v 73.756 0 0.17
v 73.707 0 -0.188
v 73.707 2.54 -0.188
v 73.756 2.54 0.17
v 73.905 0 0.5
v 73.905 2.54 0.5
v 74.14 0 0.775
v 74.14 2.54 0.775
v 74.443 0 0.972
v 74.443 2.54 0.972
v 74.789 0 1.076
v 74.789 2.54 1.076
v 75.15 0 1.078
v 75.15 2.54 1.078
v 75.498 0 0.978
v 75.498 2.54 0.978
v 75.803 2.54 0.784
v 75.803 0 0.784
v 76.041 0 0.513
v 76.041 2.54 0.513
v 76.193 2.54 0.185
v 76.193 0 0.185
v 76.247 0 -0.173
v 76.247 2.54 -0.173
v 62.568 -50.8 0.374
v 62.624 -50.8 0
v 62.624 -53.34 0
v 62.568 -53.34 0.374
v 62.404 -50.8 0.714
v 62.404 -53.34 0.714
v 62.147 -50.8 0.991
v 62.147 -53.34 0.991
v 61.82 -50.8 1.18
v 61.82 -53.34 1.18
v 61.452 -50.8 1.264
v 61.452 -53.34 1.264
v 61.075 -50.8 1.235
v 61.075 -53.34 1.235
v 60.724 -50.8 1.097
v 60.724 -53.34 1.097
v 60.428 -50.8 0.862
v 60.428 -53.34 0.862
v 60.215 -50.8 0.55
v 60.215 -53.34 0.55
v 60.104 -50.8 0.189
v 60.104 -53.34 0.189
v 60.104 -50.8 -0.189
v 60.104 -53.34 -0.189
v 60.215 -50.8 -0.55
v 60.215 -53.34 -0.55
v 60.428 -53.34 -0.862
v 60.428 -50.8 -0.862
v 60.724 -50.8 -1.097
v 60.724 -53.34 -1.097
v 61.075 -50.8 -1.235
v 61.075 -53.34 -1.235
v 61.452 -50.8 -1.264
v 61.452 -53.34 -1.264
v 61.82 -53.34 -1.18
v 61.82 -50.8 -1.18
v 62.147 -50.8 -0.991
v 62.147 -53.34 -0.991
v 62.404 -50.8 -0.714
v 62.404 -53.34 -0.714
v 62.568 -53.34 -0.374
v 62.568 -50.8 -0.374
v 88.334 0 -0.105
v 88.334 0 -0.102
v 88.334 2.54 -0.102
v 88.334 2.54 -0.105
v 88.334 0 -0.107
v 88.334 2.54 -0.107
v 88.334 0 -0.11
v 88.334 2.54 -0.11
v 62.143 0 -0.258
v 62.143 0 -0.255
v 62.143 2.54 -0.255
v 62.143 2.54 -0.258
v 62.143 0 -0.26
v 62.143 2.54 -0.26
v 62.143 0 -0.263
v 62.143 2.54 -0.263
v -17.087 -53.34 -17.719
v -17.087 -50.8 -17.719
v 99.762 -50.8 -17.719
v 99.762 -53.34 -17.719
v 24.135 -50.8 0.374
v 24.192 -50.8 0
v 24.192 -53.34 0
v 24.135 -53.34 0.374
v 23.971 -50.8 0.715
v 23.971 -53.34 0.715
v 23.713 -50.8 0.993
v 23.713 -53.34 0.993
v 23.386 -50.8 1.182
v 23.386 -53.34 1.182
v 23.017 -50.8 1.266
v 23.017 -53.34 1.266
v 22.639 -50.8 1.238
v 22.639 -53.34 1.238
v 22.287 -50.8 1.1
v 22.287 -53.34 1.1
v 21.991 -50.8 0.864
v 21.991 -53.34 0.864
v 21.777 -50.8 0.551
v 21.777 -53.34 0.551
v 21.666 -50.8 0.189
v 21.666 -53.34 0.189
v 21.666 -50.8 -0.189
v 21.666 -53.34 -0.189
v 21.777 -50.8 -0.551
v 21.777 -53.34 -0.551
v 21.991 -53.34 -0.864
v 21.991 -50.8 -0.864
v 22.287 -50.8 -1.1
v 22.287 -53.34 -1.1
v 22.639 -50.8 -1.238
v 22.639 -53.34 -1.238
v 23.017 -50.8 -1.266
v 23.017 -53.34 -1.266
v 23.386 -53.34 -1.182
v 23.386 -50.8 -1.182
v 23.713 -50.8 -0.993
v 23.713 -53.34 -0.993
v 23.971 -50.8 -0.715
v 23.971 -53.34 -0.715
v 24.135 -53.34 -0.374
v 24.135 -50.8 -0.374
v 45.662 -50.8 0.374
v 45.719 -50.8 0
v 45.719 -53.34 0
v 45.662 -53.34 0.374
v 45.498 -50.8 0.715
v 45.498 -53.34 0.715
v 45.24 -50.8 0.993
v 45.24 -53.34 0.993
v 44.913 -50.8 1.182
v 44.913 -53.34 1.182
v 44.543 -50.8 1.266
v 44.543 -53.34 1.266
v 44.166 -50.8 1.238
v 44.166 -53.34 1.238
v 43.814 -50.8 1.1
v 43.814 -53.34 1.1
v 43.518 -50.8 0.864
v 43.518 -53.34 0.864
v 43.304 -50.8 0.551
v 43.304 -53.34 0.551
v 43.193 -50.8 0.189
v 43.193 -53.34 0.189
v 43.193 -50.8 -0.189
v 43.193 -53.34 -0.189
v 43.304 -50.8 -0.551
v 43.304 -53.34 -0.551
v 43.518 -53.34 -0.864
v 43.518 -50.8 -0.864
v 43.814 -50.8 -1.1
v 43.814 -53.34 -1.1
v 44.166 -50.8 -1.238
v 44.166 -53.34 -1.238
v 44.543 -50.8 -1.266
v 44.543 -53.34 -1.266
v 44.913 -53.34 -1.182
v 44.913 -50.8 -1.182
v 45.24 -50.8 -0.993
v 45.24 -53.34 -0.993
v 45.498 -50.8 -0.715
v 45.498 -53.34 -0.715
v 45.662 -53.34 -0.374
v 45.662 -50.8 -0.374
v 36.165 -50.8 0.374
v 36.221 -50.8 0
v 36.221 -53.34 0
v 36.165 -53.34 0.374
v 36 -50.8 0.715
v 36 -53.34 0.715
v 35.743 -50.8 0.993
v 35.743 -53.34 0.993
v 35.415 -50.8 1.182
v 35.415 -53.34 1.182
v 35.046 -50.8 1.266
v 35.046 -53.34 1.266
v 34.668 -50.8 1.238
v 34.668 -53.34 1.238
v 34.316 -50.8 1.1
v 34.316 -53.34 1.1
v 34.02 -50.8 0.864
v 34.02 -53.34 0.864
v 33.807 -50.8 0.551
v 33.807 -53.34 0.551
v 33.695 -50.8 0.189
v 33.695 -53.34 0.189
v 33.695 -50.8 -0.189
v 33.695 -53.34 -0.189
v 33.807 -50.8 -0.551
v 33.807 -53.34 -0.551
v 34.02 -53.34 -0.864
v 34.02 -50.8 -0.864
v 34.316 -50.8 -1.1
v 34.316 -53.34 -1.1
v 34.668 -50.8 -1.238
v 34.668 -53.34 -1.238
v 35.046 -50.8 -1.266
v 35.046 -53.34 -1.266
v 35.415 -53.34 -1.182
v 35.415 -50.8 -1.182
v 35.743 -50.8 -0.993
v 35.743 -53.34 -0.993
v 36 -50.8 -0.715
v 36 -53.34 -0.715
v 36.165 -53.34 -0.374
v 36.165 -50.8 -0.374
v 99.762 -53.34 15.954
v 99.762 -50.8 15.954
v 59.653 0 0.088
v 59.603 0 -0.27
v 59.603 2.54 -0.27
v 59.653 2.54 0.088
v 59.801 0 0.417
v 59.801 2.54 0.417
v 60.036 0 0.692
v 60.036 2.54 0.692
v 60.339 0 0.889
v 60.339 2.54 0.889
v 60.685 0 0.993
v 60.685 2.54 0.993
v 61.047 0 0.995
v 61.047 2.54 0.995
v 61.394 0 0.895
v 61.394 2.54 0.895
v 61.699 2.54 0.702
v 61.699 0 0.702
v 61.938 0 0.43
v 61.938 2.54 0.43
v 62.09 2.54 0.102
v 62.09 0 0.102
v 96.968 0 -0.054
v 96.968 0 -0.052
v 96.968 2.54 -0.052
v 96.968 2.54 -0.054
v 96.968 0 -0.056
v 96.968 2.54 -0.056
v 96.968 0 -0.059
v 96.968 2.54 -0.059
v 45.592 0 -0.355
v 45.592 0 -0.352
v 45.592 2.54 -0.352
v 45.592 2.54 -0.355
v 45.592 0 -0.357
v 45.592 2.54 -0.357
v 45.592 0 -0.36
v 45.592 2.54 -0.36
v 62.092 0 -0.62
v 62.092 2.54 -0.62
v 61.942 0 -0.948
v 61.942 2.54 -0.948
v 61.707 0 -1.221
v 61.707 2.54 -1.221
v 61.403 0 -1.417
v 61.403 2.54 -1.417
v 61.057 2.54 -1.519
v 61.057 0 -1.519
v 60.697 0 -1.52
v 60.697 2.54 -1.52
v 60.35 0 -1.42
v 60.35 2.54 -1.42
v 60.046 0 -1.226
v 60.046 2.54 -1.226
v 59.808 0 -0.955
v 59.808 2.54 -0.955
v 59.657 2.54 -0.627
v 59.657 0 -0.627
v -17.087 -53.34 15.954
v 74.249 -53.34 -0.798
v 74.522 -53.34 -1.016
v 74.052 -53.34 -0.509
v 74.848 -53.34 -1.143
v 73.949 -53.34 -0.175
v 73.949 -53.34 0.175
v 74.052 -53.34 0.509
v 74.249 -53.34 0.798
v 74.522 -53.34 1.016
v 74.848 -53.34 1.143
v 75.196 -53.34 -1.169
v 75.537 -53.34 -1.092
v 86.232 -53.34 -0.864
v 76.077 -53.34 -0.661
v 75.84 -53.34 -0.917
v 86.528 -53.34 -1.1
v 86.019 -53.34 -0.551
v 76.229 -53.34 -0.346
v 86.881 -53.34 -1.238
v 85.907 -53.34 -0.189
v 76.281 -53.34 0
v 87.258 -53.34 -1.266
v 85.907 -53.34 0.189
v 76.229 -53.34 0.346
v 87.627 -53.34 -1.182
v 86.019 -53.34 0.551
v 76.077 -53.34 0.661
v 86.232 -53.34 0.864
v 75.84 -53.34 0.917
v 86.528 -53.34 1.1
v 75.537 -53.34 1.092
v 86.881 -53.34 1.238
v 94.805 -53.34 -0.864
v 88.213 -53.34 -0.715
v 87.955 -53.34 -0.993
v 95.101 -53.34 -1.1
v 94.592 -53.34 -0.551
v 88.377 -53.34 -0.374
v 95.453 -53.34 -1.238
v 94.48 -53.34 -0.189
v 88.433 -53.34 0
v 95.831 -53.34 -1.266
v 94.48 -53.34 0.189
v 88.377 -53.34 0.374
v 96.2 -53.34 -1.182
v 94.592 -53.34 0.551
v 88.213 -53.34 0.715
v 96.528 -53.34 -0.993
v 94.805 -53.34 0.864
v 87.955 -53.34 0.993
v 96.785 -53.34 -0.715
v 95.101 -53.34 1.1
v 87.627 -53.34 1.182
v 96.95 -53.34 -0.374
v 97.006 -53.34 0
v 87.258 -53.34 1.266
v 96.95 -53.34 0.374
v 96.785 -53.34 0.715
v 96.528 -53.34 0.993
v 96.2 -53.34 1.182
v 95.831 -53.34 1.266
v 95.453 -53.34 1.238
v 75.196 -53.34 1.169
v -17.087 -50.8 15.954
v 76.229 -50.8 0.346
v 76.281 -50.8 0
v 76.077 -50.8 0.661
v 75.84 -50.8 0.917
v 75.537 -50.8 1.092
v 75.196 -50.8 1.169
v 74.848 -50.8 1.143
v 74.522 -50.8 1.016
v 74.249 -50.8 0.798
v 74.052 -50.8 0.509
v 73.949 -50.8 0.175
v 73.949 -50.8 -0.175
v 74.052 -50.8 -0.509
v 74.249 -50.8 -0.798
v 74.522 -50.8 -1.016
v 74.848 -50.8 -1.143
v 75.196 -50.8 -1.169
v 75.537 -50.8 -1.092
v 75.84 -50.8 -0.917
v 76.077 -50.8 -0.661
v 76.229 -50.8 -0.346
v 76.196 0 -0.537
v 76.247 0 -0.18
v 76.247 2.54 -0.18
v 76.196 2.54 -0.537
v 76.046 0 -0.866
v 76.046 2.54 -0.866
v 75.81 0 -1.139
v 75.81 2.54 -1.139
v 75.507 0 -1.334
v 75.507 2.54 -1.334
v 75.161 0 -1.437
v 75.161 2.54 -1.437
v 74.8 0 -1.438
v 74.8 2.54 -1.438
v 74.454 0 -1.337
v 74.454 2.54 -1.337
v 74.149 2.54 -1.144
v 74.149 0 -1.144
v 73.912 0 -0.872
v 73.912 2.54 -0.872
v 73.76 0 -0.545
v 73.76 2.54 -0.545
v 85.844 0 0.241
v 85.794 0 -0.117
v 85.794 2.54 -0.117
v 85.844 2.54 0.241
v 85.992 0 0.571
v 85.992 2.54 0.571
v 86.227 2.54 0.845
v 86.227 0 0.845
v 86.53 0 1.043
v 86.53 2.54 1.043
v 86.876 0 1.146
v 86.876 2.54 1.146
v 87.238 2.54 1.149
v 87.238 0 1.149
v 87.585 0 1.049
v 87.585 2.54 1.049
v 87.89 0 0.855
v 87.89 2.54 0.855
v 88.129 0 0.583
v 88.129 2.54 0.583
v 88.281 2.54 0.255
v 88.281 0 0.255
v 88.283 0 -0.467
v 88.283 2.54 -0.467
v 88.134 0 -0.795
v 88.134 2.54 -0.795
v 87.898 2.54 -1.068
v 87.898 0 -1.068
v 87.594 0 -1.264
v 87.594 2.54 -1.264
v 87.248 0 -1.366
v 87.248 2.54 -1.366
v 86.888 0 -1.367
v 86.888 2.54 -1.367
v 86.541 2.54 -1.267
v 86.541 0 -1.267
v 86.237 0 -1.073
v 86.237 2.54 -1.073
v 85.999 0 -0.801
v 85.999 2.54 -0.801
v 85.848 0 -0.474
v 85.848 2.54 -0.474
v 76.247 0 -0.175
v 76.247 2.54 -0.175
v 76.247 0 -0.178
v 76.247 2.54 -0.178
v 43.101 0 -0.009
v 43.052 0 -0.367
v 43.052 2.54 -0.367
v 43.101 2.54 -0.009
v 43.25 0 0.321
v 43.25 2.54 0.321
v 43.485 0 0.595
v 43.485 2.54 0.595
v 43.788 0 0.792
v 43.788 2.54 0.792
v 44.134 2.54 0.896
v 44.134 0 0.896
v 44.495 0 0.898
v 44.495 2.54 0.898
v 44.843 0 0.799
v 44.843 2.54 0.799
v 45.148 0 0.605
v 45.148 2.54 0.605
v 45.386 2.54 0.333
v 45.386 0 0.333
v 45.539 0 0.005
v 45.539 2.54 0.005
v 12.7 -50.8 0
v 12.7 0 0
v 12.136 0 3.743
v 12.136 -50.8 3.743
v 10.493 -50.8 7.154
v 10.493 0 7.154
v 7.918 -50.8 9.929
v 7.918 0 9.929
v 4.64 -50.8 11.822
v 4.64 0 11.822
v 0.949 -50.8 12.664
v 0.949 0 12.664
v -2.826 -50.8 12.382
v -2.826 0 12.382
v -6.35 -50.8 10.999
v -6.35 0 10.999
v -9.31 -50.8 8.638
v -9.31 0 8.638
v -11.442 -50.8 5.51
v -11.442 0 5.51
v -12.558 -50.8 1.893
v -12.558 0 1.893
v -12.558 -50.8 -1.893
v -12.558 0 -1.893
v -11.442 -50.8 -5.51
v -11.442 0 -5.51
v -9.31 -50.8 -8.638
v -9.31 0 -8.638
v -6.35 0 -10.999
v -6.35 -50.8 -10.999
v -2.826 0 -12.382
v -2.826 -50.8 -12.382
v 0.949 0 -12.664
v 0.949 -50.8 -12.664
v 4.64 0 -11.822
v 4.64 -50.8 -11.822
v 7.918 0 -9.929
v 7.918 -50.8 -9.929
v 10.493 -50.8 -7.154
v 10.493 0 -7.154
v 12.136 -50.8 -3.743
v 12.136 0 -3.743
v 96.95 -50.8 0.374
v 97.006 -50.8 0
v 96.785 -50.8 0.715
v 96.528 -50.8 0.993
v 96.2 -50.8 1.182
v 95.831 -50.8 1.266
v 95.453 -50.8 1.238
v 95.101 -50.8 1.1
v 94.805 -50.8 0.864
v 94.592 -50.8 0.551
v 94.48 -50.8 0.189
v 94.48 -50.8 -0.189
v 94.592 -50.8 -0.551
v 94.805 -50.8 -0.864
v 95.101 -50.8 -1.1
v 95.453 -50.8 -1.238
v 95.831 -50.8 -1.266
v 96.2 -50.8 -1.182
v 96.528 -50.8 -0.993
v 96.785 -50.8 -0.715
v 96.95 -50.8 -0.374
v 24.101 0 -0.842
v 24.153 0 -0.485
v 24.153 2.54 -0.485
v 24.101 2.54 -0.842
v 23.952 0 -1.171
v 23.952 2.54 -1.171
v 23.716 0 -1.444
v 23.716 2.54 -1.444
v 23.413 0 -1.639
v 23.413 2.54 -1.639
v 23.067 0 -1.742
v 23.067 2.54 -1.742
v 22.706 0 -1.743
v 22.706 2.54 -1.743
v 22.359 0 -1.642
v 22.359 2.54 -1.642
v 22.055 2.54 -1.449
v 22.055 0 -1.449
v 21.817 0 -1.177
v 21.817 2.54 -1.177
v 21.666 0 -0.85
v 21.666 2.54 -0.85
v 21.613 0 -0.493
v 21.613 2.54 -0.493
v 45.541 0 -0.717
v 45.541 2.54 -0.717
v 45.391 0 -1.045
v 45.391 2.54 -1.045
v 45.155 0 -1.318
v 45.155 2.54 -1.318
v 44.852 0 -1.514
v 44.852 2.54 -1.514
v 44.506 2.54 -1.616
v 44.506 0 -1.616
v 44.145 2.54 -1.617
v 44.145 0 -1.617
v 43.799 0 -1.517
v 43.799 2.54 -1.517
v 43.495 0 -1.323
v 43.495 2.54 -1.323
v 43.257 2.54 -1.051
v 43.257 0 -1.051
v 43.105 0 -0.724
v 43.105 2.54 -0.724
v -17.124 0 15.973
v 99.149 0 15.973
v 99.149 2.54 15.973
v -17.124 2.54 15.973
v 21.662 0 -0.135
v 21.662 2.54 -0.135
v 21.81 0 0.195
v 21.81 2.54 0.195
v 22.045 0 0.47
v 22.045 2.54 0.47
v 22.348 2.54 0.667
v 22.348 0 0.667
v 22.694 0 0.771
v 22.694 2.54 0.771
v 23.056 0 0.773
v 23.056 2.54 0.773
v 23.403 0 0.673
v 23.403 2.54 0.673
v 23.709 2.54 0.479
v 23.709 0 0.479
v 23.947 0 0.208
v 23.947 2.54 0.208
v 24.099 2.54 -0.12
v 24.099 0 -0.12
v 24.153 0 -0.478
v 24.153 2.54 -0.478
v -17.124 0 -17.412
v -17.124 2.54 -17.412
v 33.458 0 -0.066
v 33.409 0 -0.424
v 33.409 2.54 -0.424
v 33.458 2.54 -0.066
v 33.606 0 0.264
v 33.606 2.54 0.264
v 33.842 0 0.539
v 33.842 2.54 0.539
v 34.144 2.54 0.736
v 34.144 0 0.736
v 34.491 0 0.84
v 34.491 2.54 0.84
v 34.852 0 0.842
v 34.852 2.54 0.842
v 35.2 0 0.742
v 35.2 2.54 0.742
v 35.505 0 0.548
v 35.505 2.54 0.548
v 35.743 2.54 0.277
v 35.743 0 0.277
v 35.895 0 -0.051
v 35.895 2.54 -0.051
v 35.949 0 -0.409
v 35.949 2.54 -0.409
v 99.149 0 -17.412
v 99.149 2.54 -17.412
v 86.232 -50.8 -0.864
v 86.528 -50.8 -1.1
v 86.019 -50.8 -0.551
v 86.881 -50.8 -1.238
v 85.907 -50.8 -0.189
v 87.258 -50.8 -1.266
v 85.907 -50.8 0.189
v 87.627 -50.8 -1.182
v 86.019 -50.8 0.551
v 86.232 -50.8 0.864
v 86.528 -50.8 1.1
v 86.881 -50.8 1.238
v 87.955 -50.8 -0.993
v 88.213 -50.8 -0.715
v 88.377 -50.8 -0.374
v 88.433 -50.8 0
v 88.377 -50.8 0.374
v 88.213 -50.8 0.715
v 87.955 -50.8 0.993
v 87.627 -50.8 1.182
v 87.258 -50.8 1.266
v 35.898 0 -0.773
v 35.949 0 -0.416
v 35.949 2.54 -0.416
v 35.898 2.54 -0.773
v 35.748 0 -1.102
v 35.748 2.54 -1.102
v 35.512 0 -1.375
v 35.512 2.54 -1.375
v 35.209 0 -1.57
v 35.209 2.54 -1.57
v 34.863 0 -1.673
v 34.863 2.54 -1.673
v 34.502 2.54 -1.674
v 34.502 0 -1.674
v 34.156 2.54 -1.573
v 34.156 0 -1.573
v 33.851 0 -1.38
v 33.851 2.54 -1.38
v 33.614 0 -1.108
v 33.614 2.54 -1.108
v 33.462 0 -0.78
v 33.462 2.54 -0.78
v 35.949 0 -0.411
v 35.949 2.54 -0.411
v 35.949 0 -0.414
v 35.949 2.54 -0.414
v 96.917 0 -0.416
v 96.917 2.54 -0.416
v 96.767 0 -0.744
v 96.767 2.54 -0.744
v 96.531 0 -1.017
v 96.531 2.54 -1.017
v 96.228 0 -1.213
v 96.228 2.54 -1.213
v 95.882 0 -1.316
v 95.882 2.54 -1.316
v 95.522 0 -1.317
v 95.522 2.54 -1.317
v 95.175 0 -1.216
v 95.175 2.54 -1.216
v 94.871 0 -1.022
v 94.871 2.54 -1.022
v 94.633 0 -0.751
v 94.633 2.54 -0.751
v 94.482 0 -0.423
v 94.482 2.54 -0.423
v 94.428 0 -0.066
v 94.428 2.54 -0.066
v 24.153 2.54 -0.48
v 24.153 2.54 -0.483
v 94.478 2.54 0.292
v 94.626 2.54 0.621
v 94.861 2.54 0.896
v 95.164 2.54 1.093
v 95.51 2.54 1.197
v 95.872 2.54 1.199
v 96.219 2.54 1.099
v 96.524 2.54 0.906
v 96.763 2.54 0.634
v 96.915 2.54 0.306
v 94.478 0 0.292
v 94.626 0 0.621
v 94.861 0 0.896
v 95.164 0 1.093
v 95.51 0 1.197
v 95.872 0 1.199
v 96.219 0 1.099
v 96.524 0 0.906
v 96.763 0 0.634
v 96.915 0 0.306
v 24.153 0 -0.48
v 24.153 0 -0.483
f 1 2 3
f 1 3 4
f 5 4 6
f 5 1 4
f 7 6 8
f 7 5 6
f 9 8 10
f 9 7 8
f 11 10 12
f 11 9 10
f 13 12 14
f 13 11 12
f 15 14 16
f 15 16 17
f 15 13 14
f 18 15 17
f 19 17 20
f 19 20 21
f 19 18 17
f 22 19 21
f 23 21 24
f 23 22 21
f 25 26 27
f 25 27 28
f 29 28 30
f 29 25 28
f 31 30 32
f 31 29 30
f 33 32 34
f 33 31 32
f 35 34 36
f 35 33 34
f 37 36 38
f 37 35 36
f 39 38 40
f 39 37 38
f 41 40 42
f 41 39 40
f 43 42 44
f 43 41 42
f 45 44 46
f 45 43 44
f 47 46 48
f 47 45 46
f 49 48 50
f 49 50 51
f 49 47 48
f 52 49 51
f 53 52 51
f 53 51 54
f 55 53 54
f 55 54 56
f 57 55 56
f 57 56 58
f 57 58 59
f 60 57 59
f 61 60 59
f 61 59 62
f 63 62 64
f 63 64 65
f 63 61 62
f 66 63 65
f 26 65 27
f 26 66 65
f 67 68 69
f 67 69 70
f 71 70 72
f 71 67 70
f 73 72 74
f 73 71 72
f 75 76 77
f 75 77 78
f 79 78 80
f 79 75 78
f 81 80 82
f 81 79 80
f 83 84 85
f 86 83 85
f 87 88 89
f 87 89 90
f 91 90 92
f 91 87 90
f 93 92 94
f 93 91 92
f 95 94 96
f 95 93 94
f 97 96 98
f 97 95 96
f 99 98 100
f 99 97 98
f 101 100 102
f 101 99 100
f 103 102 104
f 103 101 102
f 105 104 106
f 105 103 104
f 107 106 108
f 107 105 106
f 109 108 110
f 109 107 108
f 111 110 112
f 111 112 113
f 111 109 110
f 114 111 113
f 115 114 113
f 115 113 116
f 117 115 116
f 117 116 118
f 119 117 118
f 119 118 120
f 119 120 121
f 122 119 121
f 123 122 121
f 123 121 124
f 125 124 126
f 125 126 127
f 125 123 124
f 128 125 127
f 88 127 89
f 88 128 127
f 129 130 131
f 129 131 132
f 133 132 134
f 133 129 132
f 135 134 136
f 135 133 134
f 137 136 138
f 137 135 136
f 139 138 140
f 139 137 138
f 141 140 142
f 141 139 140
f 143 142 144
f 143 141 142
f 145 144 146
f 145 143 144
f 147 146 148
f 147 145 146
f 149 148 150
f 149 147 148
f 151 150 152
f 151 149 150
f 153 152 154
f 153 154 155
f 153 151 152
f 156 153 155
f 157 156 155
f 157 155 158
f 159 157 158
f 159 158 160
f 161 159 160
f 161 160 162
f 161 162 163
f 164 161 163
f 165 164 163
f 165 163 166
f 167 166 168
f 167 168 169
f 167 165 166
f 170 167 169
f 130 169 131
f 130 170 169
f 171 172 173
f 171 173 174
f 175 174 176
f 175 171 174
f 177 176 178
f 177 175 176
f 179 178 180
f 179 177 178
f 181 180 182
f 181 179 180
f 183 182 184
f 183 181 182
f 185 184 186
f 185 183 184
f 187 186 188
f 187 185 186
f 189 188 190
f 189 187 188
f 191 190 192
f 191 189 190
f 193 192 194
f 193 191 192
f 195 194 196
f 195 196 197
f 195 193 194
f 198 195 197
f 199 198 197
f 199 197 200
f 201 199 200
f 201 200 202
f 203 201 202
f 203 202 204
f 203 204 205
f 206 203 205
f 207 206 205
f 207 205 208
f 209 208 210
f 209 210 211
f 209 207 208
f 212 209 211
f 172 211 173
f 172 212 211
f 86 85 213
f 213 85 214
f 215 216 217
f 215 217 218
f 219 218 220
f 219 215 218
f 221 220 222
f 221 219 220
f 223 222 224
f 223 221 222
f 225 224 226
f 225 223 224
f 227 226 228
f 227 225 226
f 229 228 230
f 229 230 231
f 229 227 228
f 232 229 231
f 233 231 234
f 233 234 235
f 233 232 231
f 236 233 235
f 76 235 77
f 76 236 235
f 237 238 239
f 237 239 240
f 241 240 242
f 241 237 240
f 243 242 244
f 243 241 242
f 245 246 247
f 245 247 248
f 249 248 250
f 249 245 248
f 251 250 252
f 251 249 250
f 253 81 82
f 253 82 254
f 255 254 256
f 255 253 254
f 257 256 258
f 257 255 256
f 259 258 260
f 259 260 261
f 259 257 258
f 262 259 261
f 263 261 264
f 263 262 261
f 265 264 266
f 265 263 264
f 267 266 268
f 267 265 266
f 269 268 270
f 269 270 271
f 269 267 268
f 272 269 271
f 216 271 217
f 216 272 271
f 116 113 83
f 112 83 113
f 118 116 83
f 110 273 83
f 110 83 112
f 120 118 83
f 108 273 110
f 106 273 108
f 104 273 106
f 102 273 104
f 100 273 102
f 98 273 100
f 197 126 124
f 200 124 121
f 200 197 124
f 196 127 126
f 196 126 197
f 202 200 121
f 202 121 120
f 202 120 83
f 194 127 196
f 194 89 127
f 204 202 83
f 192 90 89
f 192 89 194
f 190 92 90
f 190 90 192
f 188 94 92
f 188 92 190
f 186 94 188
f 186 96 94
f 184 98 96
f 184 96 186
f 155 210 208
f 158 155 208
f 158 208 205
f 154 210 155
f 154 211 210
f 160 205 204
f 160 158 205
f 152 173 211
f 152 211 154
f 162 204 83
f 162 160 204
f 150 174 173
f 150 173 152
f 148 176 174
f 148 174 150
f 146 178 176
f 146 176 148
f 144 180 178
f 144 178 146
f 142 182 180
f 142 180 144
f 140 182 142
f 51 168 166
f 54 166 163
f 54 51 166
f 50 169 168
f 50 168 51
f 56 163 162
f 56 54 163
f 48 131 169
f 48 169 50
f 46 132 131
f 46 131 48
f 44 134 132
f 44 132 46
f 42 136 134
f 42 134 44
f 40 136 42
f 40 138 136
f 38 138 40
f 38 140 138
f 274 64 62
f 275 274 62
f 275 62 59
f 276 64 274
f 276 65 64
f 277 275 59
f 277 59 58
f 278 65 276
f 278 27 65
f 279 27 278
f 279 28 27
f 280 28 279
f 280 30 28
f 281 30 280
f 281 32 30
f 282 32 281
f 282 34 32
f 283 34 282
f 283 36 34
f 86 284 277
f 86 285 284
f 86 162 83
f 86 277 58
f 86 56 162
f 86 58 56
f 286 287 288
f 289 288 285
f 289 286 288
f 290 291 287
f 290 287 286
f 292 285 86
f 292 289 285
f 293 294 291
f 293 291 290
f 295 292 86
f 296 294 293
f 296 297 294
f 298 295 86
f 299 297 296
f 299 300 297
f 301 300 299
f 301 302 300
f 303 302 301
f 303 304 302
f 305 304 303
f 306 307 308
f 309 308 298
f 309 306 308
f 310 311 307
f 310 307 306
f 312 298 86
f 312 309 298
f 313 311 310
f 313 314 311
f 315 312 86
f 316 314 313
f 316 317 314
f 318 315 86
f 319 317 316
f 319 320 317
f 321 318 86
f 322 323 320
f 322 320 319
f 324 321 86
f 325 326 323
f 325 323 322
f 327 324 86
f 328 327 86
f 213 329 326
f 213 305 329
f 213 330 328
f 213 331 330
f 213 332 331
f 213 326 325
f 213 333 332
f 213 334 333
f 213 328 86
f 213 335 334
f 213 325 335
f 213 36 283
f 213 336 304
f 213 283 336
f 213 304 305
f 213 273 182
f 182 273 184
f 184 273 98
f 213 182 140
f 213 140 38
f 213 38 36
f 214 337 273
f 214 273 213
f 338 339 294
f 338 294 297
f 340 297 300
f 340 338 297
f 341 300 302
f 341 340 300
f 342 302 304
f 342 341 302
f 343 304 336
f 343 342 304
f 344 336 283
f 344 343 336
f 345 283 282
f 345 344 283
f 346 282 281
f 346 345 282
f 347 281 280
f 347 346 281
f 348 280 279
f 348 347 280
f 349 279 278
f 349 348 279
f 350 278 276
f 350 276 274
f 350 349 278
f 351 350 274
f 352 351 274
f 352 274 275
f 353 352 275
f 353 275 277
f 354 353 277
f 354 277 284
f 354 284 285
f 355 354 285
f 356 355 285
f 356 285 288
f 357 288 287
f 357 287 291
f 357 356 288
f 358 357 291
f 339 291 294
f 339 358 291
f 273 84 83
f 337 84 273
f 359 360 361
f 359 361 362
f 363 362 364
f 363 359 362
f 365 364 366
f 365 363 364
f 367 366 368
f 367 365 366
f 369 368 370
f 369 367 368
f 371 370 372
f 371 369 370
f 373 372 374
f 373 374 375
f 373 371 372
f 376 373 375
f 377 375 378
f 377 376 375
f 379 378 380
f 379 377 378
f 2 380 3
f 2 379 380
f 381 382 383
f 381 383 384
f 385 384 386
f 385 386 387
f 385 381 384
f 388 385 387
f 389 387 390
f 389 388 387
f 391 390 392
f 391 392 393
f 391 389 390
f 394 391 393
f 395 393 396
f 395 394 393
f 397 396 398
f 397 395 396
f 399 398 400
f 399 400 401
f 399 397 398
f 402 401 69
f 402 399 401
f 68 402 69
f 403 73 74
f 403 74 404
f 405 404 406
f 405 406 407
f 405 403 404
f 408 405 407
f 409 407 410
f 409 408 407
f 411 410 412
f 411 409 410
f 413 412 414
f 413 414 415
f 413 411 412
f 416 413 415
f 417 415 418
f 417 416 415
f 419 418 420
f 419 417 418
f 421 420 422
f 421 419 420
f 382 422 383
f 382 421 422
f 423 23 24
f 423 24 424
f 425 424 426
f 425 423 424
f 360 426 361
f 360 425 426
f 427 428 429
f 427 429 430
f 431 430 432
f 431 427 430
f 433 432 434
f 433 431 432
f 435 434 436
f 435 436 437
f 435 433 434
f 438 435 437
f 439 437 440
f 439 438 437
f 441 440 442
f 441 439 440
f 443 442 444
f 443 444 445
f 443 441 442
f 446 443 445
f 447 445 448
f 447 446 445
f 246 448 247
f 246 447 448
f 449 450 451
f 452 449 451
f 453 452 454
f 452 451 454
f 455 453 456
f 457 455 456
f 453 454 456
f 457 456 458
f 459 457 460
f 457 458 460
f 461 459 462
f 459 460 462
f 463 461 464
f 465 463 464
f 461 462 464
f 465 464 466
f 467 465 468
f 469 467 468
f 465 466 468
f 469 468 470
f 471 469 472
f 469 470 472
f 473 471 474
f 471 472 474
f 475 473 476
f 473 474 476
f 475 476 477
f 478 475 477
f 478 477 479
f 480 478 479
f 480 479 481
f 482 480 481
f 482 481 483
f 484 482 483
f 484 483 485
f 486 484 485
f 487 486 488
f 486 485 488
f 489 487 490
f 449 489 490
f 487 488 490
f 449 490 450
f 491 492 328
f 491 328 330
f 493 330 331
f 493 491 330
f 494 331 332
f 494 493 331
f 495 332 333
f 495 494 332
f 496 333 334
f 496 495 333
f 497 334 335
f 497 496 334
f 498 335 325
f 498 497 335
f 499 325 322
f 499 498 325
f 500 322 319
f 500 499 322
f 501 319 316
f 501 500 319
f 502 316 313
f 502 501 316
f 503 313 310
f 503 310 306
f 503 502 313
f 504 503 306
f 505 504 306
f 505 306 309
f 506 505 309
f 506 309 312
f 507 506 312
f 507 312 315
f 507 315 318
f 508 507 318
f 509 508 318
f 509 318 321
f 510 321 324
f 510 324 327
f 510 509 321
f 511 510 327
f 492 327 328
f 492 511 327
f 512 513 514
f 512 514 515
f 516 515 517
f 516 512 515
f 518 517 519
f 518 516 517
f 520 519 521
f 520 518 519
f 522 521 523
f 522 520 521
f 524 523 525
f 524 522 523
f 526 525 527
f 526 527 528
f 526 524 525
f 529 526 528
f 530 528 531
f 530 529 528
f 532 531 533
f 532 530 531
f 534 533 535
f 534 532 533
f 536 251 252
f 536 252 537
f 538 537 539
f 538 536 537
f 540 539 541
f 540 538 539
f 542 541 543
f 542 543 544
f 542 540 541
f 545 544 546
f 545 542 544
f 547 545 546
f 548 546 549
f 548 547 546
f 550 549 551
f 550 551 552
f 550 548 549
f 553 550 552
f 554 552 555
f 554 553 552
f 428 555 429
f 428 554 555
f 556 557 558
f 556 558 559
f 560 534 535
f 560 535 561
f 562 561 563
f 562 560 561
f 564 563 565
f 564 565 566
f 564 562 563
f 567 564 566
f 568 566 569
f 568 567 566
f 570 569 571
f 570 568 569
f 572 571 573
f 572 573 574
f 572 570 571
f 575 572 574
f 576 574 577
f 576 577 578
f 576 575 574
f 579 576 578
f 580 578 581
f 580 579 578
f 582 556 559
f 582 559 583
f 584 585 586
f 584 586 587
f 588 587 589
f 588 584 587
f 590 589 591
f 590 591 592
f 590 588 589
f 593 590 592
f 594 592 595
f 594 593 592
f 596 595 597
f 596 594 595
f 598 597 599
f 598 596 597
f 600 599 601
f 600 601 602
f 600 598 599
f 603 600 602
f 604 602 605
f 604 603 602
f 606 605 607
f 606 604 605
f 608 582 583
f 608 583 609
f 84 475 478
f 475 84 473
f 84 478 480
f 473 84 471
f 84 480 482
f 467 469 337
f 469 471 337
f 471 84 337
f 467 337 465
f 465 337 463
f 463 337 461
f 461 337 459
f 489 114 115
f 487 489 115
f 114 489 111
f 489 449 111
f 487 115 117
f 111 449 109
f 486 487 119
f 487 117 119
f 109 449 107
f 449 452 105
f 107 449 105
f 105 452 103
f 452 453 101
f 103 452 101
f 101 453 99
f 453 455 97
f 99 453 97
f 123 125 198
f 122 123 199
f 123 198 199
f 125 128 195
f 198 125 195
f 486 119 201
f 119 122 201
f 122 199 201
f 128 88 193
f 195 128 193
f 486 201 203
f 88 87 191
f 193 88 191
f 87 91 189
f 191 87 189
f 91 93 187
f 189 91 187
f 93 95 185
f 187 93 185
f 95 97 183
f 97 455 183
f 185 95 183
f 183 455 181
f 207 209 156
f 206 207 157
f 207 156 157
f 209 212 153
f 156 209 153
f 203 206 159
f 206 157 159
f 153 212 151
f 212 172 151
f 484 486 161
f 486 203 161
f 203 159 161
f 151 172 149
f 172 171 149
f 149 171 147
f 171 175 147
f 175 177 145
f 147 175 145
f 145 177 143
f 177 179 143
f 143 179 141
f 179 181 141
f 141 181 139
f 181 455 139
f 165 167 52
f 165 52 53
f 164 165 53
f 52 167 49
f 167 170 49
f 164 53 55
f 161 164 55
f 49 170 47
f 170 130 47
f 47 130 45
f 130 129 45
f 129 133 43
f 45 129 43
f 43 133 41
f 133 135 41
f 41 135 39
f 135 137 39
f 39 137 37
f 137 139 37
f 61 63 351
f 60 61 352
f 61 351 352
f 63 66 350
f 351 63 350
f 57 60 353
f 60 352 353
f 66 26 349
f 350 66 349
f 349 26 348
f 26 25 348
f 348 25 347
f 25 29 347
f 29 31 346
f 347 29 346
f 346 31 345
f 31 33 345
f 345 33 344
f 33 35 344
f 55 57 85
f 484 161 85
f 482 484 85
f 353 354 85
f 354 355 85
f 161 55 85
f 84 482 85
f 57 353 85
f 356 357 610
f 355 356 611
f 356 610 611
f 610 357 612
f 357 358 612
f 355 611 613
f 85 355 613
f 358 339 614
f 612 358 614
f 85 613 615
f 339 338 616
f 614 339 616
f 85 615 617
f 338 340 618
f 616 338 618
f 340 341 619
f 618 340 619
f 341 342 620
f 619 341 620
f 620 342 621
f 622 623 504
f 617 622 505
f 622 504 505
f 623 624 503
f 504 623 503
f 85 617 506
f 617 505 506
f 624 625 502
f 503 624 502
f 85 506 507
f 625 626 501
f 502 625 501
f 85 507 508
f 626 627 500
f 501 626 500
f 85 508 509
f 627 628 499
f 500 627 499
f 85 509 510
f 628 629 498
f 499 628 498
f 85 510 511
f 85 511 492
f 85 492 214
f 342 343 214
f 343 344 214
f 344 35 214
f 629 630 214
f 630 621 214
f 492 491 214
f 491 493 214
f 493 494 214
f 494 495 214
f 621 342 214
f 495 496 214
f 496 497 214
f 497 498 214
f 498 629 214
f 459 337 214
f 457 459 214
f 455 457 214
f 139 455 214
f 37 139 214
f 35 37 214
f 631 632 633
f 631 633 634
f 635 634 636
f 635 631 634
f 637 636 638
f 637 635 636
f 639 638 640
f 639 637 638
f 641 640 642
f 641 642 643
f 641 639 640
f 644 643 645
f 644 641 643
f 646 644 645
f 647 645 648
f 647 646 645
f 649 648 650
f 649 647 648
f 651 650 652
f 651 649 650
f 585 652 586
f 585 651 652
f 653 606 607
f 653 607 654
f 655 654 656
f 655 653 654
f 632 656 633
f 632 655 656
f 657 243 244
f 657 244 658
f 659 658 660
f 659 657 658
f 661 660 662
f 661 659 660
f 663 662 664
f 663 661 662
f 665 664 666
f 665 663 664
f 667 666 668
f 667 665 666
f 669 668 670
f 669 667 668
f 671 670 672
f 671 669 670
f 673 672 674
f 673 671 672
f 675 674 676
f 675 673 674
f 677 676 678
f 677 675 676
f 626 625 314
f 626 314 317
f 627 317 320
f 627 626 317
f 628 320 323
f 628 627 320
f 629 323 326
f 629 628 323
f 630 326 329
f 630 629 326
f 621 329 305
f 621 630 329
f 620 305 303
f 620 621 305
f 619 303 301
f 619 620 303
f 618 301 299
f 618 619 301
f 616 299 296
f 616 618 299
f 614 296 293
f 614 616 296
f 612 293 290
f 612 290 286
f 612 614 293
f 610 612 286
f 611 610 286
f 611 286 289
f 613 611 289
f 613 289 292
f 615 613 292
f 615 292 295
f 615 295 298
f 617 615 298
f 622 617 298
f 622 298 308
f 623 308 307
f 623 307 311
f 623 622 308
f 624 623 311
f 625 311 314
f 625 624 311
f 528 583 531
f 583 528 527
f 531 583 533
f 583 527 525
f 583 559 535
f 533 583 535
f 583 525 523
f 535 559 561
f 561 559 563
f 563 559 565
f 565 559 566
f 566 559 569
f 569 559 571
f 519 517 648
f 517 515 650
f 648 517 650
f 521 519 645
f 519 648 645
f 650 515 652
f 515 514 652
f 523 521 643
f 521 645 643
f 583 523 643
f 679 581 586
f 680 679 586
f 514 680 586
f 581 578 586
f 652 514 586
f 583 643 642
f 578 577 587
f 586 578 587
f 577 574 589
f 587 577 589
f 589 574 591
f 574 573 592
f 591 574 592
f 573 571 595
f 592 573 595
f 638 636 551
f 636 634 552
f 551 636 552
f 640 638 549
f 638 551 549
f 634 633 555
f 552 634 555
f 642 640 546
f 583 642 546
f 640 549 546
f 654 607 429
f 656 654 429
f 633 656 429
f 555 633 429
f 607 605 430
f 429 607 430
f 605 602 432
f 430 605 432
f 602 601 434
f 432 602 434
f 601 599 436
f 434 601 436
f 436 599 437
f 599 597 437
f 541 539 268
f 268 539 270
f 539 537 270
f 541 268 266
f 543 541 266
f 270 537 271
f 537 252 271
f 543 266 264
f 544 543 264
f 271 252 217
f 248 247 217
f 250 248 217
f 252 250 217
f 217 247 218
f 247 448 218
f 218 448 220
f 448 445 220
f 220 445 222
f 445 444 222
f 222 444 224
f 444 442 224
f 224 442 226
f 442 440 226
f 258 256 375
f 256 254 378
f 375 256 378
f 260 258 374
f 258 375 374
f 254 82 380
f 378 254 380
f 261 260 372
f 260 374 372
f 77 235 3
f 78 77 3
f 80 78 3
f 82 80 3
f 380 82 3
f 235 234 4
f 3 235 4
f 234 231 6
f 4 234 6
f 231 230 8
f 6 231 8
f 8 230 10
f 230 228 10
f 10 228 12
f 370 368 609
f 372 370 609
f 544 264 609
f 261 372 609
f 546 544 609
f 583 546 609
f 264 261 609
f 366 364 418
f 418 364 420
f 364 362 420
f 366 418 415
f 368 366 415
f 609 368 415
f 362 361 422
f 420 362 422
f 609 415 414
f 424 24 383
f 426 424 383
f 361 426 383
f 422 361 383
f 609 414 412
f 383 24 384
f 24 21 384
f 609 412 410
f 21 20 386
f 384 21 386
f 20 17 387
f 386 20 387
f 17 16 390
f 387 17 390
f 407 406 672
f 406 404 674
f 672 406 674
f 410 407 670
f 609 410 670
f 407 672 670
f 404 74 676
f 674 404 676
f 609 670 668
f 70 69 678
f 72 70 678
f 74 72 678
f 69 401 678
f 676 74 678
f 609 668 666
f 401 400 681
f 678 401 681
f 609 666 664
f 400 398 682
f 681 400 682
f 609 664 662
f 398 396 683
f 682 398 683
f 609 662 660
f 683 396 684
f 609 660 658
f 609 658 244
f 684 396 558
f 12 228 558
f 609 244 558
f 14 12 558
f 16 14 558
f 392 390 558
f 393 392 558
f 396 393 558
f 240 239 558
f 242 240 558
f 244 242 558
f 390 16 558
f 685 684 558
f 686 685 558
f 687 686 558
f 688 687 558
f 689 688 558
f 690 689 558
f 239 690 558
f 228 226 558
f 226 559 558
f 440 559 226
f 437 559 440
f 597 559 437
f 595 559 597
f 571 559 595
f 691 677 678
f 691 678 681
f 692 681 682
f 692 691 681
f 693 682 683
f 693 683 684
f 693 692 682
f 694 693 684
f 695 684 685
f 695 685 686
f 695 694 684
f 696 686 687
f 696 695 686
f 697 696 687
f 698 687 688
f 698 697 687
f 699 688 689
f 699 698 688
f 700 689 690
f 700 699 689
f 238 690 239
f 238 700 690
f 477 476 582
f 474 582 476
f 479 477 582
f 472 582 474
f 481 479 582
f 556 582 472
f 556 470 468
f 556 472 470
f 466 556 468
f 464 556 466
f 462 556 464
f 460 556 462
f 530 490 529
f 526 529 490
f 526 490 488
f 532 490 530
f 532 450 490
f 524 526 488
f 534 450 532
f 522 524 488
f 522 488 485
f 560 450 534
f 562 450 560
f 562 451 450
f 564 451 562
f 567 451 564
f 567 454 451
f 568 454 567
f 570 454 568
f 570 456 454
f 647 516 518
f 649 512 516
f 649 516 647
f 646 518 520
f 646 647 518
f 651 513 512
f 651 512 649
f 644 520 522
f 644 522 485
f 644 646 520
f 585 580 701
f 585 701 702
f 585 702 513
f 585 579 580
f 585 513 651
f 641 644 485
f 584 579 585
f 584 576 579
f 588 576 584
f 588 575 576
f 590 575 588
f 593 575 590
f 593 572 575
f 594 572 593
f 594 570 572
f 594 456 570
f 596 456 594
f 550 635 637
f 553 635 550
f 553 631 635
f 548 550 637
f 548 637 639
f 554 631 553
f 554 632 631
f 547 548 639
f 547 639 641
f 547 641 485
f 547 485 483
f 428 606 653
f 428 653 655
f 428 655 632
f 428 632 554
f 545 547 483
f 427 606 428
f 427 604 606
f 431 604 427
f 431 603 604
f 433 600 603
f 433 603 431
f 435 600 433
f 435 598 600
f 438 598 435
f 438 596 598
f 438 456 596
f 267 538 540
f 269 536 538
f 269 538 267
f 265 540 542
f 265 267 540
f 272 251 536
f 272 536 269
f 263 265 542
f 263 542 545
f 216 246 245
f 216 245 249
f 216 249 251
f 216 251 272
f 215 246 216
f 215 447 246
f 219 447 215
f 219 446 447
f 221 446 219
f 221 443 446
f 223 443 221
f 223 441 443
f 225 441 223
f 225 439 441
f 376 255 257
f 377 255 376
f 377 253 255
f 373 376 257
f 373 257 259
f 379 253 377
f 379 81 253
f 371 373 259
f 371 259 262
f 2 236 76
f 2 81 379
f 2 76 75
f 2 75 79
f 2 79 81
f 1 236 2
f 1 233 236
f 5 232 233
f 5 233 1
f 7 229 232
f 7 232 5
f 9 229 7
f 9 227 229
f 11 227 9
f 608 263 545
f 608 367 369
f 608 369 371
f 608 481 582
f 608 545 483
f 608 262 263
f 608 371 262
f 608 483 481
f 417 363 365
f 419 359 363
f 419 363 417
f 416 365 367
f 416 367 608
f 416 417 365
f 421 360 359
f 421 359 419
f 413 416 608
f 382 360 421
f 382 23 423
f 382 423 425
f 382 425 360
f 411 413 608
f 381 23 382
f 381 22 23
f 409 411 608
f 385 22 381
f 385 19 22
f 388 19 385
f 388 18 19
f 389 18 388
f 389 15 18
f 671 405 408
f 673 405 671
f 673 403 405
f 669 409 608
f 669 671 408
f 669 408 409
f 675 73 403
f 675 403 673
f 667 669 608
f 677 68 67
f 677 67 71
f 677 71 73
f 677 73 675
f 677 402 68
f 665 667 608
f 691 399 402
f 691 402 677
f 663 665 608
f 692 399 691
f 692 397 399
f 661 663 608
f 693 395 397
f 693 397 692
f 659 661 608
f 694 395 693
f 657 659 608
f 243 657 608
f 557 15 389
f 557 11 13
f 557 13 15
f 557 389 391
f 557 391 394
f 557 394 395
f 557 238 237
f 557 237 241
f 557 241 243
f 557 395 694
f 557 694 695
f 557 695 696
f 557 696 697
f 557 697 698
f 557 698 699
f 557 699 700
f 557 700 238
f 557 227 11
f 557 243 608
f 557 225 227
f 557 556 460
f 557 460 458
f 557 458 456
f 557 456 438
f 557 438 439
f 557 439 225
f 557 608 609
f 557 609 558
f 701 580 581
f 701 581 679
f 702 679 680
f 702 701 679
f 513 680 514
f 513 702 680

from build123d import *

# Parameters (mm, degrees)
F0_R     = 12.7
F1_DEPTH = 50.8
F2_R     = 1.27
F3_DEPTH = 2.54
F4_R     = 1.27
F5_DEPTH = 2.54
F7_DEPTH = 2.54
F8_W     = 116.849138
F8_H     = 33.673273
F8_R     = 1.27
F8_R_2   = 1.267219
F8_R_3   = 1.172691
F9_DEPTH = 2.54


with BuildPart() as f1:
    # F0 (on Front) → F1 (new body)
    with BuildSketch(Plane.XZ):
        Circle(F0_R)
    extrude(amount=F1_DEPTH)

    # F2 (on face) → F3 (join)
    with BuildSketch(Plane.XZ.offset(50.8)):
        Circle(F2_R)
    extrude(amount=F3_DEPTH)

    # F4 (on face) → F5 (join)
    with BuildSketch(Plane(origin=(0, 0, 0), x_dir=(-1, 0, 0), z_dir=(0, 1, 0))):
        Circle(F4_R)
    extrude(amount=F5_DEPTH)

    # F6 (on Front) → F7 (join)
    with BuildSketch(Plane.XZ):
        with BuildLine():
            Line((21.612578, -0.492717), (-17.124444, -0.719515))
            Line((-17.124444, -0.719515), (-17.124444, -17.412249))
            Line((-17.124444, -17.412249), (99.149086, -17.412249))
            Line((99.149086, -17.412249), (99.149086, -0.038756))
            Line((99.149086, -0.038756), (96.968265, -0.051524))
            ThreePointArc((96.968265, -0.051524), (96.968281, -0.055242), (96.968286, -0.05896))
            ThreePointArc((96.968286, -0.05896), (95.702004, -1.328954), (94.428308, -0.066395))
            Line((94.428308, -0.066395), (88.334388, -0.102074))
            ThreePointArc((88.334388, -0.102074), (88.334405, -0.105792), (88.33441, -0.109509))
            ThreePointArc((88.33441, -0.109509), (87.068128, -1.379504), (85.794432, -0.116945))
            Line((85.794432, -0.116945), (76.246966, -0.172843))
            ThreePointArc((76.246966, -0.172843), (76.246982, -0.176561), (76.246987, -0.180279))
            ThreePointArc((76.246987, -0.180279), (74.980705, -1.450273), (73.707009, -0.187714))
            Line((73.707009, -0.187714), (62.143279, -0.255418))
            ThreePointArc((62.143279, -0.255418), (62.143295, -0.259135), (62.143301, -0.262853))
            ThreePointArc((62.143301, -0.262853), (60.877019, -1.532848), (59.603323, -0.270289))
            Line((59.603323, -0.270289), (45.592063, -0.352322))
            ThreePointArc((45.592063, -0.352322), (45.592079, -0.35604), (45.592085, -0.359757))
            ThreePointArc((45.592085, -0.359757), (44.325802, -1.629752), (43.052106, -0.367193))
            Line((43.052106, -0.367193), (35.948796, -0.408781))
            ThreePointArc((35.948796, -0.408781), (35.948813, -0.412499), (35.948818, -0.416217))
            ThreePointArc((35.948818, -0.416217), (34.682536, -1.686211), (33.40884, -0.423652))
            Line((33.40884, -0.423652), (24.152535, -0.477846))
            ThreePointArc((24.152535, -0.477846), (24.152551, -0.481564), (24.152557, -0.485282))
            ThreePointArc((24.152557, -0.485282), (22.886274, -1.755276), (21.612578, -0.492717))
        make_face()
        with BuildLine():
            Line((99.149086, 15.97322), (-17.124444, 15.97322))
            Line((-17.124444, 15.97322), (-17.124444, -0.719515))
            Line((-17.124444, -0.719515), (21.612578, -0.492717))
            ThreePointArc((21.612578, -0.492717), (22.875121, 0.784697), (24.152535, -0.477846))
            Line((24.152535, -0.477846), (33.40884, -0.423652))
            ThreePointArc((33.40884, -0.423652), (34.671383, 0.853761), (35.948796, -0.408781))
            Line((35.948796, -0.408781), (43.052106, -0.367193))
            ThreePointArc((43.052106, -0.367193), (44.314649, 0.910221), (45.592063, -0.352322))
            Line((45.592063, -0.352322), (59.603323, -0.270289))
            ThreePointArc((59.603323, -0.270289), (60.865865, 1.007125), (62.143279, -0.255418))
            Line((62.143279, -0.255418), (73.707009, -0.187714))
            ThreePointArc((73.707009, -0.187714), (74.969552, 1.089699), (76.246966, -0.172843))
            Line((76.246966, -0.172843), (85.794432, -0.116945))
            ThreePointArc((85.794432, -0.116945), (87.056975, 1.160469), (88.334388, -0.102074))
            Line((88.334388, -0.102074), (94.428308, -0.066395))
            ThreePointArc((94.428308, -0.066395), (95.690851, 1.211018), (96.968265, -0.051524))
            Line((96.968265, -0.051524), (99.149086, -0.038756))
            Line((99.149086, -0.038756), (99.149086, 15.97322))
        make_face()
    extrude(amount=-F7_DEPTH)

    # F8 (on face) → F9 (join)
    with BuildSketch(Plane.XZ.offset(50.8)):
        with Locations((41.337759, -0.882761)):
            Rectangle(F8_W, F8_H)
        Circle(F8_R, mode=Mode.SUBTRACT)
        with Locations((22.921631, 0)):
            Circle(F8_R, mode=Mode.SUBTRACT)
        with Locations((34.950949, 0)):
            Circle(F8_R, mode=Mode.SUBTRACT)
        with Locations((44.44854, 0)):
            Circle(F8_R, mode=Mode.SUBTRACT)
        with Locations((61.357126, 0)):
            Circle(F8_R_2, mode=Mode.SUBTRACT)
        with Locations((75.108536, 0)):
            Circle(F8_R_3, mode=Mode.SUBTRACT)
        with Locations((87.163217, 0)):
            Circle(F8_R, mode=Mode.SUBTRACT)
        with Locations((95.73599, 0)):
            Circle(F8_R, mode=Mode.SUBTRACT)
    extrude(amount=F9_DEPTH)


solid = f1.part
